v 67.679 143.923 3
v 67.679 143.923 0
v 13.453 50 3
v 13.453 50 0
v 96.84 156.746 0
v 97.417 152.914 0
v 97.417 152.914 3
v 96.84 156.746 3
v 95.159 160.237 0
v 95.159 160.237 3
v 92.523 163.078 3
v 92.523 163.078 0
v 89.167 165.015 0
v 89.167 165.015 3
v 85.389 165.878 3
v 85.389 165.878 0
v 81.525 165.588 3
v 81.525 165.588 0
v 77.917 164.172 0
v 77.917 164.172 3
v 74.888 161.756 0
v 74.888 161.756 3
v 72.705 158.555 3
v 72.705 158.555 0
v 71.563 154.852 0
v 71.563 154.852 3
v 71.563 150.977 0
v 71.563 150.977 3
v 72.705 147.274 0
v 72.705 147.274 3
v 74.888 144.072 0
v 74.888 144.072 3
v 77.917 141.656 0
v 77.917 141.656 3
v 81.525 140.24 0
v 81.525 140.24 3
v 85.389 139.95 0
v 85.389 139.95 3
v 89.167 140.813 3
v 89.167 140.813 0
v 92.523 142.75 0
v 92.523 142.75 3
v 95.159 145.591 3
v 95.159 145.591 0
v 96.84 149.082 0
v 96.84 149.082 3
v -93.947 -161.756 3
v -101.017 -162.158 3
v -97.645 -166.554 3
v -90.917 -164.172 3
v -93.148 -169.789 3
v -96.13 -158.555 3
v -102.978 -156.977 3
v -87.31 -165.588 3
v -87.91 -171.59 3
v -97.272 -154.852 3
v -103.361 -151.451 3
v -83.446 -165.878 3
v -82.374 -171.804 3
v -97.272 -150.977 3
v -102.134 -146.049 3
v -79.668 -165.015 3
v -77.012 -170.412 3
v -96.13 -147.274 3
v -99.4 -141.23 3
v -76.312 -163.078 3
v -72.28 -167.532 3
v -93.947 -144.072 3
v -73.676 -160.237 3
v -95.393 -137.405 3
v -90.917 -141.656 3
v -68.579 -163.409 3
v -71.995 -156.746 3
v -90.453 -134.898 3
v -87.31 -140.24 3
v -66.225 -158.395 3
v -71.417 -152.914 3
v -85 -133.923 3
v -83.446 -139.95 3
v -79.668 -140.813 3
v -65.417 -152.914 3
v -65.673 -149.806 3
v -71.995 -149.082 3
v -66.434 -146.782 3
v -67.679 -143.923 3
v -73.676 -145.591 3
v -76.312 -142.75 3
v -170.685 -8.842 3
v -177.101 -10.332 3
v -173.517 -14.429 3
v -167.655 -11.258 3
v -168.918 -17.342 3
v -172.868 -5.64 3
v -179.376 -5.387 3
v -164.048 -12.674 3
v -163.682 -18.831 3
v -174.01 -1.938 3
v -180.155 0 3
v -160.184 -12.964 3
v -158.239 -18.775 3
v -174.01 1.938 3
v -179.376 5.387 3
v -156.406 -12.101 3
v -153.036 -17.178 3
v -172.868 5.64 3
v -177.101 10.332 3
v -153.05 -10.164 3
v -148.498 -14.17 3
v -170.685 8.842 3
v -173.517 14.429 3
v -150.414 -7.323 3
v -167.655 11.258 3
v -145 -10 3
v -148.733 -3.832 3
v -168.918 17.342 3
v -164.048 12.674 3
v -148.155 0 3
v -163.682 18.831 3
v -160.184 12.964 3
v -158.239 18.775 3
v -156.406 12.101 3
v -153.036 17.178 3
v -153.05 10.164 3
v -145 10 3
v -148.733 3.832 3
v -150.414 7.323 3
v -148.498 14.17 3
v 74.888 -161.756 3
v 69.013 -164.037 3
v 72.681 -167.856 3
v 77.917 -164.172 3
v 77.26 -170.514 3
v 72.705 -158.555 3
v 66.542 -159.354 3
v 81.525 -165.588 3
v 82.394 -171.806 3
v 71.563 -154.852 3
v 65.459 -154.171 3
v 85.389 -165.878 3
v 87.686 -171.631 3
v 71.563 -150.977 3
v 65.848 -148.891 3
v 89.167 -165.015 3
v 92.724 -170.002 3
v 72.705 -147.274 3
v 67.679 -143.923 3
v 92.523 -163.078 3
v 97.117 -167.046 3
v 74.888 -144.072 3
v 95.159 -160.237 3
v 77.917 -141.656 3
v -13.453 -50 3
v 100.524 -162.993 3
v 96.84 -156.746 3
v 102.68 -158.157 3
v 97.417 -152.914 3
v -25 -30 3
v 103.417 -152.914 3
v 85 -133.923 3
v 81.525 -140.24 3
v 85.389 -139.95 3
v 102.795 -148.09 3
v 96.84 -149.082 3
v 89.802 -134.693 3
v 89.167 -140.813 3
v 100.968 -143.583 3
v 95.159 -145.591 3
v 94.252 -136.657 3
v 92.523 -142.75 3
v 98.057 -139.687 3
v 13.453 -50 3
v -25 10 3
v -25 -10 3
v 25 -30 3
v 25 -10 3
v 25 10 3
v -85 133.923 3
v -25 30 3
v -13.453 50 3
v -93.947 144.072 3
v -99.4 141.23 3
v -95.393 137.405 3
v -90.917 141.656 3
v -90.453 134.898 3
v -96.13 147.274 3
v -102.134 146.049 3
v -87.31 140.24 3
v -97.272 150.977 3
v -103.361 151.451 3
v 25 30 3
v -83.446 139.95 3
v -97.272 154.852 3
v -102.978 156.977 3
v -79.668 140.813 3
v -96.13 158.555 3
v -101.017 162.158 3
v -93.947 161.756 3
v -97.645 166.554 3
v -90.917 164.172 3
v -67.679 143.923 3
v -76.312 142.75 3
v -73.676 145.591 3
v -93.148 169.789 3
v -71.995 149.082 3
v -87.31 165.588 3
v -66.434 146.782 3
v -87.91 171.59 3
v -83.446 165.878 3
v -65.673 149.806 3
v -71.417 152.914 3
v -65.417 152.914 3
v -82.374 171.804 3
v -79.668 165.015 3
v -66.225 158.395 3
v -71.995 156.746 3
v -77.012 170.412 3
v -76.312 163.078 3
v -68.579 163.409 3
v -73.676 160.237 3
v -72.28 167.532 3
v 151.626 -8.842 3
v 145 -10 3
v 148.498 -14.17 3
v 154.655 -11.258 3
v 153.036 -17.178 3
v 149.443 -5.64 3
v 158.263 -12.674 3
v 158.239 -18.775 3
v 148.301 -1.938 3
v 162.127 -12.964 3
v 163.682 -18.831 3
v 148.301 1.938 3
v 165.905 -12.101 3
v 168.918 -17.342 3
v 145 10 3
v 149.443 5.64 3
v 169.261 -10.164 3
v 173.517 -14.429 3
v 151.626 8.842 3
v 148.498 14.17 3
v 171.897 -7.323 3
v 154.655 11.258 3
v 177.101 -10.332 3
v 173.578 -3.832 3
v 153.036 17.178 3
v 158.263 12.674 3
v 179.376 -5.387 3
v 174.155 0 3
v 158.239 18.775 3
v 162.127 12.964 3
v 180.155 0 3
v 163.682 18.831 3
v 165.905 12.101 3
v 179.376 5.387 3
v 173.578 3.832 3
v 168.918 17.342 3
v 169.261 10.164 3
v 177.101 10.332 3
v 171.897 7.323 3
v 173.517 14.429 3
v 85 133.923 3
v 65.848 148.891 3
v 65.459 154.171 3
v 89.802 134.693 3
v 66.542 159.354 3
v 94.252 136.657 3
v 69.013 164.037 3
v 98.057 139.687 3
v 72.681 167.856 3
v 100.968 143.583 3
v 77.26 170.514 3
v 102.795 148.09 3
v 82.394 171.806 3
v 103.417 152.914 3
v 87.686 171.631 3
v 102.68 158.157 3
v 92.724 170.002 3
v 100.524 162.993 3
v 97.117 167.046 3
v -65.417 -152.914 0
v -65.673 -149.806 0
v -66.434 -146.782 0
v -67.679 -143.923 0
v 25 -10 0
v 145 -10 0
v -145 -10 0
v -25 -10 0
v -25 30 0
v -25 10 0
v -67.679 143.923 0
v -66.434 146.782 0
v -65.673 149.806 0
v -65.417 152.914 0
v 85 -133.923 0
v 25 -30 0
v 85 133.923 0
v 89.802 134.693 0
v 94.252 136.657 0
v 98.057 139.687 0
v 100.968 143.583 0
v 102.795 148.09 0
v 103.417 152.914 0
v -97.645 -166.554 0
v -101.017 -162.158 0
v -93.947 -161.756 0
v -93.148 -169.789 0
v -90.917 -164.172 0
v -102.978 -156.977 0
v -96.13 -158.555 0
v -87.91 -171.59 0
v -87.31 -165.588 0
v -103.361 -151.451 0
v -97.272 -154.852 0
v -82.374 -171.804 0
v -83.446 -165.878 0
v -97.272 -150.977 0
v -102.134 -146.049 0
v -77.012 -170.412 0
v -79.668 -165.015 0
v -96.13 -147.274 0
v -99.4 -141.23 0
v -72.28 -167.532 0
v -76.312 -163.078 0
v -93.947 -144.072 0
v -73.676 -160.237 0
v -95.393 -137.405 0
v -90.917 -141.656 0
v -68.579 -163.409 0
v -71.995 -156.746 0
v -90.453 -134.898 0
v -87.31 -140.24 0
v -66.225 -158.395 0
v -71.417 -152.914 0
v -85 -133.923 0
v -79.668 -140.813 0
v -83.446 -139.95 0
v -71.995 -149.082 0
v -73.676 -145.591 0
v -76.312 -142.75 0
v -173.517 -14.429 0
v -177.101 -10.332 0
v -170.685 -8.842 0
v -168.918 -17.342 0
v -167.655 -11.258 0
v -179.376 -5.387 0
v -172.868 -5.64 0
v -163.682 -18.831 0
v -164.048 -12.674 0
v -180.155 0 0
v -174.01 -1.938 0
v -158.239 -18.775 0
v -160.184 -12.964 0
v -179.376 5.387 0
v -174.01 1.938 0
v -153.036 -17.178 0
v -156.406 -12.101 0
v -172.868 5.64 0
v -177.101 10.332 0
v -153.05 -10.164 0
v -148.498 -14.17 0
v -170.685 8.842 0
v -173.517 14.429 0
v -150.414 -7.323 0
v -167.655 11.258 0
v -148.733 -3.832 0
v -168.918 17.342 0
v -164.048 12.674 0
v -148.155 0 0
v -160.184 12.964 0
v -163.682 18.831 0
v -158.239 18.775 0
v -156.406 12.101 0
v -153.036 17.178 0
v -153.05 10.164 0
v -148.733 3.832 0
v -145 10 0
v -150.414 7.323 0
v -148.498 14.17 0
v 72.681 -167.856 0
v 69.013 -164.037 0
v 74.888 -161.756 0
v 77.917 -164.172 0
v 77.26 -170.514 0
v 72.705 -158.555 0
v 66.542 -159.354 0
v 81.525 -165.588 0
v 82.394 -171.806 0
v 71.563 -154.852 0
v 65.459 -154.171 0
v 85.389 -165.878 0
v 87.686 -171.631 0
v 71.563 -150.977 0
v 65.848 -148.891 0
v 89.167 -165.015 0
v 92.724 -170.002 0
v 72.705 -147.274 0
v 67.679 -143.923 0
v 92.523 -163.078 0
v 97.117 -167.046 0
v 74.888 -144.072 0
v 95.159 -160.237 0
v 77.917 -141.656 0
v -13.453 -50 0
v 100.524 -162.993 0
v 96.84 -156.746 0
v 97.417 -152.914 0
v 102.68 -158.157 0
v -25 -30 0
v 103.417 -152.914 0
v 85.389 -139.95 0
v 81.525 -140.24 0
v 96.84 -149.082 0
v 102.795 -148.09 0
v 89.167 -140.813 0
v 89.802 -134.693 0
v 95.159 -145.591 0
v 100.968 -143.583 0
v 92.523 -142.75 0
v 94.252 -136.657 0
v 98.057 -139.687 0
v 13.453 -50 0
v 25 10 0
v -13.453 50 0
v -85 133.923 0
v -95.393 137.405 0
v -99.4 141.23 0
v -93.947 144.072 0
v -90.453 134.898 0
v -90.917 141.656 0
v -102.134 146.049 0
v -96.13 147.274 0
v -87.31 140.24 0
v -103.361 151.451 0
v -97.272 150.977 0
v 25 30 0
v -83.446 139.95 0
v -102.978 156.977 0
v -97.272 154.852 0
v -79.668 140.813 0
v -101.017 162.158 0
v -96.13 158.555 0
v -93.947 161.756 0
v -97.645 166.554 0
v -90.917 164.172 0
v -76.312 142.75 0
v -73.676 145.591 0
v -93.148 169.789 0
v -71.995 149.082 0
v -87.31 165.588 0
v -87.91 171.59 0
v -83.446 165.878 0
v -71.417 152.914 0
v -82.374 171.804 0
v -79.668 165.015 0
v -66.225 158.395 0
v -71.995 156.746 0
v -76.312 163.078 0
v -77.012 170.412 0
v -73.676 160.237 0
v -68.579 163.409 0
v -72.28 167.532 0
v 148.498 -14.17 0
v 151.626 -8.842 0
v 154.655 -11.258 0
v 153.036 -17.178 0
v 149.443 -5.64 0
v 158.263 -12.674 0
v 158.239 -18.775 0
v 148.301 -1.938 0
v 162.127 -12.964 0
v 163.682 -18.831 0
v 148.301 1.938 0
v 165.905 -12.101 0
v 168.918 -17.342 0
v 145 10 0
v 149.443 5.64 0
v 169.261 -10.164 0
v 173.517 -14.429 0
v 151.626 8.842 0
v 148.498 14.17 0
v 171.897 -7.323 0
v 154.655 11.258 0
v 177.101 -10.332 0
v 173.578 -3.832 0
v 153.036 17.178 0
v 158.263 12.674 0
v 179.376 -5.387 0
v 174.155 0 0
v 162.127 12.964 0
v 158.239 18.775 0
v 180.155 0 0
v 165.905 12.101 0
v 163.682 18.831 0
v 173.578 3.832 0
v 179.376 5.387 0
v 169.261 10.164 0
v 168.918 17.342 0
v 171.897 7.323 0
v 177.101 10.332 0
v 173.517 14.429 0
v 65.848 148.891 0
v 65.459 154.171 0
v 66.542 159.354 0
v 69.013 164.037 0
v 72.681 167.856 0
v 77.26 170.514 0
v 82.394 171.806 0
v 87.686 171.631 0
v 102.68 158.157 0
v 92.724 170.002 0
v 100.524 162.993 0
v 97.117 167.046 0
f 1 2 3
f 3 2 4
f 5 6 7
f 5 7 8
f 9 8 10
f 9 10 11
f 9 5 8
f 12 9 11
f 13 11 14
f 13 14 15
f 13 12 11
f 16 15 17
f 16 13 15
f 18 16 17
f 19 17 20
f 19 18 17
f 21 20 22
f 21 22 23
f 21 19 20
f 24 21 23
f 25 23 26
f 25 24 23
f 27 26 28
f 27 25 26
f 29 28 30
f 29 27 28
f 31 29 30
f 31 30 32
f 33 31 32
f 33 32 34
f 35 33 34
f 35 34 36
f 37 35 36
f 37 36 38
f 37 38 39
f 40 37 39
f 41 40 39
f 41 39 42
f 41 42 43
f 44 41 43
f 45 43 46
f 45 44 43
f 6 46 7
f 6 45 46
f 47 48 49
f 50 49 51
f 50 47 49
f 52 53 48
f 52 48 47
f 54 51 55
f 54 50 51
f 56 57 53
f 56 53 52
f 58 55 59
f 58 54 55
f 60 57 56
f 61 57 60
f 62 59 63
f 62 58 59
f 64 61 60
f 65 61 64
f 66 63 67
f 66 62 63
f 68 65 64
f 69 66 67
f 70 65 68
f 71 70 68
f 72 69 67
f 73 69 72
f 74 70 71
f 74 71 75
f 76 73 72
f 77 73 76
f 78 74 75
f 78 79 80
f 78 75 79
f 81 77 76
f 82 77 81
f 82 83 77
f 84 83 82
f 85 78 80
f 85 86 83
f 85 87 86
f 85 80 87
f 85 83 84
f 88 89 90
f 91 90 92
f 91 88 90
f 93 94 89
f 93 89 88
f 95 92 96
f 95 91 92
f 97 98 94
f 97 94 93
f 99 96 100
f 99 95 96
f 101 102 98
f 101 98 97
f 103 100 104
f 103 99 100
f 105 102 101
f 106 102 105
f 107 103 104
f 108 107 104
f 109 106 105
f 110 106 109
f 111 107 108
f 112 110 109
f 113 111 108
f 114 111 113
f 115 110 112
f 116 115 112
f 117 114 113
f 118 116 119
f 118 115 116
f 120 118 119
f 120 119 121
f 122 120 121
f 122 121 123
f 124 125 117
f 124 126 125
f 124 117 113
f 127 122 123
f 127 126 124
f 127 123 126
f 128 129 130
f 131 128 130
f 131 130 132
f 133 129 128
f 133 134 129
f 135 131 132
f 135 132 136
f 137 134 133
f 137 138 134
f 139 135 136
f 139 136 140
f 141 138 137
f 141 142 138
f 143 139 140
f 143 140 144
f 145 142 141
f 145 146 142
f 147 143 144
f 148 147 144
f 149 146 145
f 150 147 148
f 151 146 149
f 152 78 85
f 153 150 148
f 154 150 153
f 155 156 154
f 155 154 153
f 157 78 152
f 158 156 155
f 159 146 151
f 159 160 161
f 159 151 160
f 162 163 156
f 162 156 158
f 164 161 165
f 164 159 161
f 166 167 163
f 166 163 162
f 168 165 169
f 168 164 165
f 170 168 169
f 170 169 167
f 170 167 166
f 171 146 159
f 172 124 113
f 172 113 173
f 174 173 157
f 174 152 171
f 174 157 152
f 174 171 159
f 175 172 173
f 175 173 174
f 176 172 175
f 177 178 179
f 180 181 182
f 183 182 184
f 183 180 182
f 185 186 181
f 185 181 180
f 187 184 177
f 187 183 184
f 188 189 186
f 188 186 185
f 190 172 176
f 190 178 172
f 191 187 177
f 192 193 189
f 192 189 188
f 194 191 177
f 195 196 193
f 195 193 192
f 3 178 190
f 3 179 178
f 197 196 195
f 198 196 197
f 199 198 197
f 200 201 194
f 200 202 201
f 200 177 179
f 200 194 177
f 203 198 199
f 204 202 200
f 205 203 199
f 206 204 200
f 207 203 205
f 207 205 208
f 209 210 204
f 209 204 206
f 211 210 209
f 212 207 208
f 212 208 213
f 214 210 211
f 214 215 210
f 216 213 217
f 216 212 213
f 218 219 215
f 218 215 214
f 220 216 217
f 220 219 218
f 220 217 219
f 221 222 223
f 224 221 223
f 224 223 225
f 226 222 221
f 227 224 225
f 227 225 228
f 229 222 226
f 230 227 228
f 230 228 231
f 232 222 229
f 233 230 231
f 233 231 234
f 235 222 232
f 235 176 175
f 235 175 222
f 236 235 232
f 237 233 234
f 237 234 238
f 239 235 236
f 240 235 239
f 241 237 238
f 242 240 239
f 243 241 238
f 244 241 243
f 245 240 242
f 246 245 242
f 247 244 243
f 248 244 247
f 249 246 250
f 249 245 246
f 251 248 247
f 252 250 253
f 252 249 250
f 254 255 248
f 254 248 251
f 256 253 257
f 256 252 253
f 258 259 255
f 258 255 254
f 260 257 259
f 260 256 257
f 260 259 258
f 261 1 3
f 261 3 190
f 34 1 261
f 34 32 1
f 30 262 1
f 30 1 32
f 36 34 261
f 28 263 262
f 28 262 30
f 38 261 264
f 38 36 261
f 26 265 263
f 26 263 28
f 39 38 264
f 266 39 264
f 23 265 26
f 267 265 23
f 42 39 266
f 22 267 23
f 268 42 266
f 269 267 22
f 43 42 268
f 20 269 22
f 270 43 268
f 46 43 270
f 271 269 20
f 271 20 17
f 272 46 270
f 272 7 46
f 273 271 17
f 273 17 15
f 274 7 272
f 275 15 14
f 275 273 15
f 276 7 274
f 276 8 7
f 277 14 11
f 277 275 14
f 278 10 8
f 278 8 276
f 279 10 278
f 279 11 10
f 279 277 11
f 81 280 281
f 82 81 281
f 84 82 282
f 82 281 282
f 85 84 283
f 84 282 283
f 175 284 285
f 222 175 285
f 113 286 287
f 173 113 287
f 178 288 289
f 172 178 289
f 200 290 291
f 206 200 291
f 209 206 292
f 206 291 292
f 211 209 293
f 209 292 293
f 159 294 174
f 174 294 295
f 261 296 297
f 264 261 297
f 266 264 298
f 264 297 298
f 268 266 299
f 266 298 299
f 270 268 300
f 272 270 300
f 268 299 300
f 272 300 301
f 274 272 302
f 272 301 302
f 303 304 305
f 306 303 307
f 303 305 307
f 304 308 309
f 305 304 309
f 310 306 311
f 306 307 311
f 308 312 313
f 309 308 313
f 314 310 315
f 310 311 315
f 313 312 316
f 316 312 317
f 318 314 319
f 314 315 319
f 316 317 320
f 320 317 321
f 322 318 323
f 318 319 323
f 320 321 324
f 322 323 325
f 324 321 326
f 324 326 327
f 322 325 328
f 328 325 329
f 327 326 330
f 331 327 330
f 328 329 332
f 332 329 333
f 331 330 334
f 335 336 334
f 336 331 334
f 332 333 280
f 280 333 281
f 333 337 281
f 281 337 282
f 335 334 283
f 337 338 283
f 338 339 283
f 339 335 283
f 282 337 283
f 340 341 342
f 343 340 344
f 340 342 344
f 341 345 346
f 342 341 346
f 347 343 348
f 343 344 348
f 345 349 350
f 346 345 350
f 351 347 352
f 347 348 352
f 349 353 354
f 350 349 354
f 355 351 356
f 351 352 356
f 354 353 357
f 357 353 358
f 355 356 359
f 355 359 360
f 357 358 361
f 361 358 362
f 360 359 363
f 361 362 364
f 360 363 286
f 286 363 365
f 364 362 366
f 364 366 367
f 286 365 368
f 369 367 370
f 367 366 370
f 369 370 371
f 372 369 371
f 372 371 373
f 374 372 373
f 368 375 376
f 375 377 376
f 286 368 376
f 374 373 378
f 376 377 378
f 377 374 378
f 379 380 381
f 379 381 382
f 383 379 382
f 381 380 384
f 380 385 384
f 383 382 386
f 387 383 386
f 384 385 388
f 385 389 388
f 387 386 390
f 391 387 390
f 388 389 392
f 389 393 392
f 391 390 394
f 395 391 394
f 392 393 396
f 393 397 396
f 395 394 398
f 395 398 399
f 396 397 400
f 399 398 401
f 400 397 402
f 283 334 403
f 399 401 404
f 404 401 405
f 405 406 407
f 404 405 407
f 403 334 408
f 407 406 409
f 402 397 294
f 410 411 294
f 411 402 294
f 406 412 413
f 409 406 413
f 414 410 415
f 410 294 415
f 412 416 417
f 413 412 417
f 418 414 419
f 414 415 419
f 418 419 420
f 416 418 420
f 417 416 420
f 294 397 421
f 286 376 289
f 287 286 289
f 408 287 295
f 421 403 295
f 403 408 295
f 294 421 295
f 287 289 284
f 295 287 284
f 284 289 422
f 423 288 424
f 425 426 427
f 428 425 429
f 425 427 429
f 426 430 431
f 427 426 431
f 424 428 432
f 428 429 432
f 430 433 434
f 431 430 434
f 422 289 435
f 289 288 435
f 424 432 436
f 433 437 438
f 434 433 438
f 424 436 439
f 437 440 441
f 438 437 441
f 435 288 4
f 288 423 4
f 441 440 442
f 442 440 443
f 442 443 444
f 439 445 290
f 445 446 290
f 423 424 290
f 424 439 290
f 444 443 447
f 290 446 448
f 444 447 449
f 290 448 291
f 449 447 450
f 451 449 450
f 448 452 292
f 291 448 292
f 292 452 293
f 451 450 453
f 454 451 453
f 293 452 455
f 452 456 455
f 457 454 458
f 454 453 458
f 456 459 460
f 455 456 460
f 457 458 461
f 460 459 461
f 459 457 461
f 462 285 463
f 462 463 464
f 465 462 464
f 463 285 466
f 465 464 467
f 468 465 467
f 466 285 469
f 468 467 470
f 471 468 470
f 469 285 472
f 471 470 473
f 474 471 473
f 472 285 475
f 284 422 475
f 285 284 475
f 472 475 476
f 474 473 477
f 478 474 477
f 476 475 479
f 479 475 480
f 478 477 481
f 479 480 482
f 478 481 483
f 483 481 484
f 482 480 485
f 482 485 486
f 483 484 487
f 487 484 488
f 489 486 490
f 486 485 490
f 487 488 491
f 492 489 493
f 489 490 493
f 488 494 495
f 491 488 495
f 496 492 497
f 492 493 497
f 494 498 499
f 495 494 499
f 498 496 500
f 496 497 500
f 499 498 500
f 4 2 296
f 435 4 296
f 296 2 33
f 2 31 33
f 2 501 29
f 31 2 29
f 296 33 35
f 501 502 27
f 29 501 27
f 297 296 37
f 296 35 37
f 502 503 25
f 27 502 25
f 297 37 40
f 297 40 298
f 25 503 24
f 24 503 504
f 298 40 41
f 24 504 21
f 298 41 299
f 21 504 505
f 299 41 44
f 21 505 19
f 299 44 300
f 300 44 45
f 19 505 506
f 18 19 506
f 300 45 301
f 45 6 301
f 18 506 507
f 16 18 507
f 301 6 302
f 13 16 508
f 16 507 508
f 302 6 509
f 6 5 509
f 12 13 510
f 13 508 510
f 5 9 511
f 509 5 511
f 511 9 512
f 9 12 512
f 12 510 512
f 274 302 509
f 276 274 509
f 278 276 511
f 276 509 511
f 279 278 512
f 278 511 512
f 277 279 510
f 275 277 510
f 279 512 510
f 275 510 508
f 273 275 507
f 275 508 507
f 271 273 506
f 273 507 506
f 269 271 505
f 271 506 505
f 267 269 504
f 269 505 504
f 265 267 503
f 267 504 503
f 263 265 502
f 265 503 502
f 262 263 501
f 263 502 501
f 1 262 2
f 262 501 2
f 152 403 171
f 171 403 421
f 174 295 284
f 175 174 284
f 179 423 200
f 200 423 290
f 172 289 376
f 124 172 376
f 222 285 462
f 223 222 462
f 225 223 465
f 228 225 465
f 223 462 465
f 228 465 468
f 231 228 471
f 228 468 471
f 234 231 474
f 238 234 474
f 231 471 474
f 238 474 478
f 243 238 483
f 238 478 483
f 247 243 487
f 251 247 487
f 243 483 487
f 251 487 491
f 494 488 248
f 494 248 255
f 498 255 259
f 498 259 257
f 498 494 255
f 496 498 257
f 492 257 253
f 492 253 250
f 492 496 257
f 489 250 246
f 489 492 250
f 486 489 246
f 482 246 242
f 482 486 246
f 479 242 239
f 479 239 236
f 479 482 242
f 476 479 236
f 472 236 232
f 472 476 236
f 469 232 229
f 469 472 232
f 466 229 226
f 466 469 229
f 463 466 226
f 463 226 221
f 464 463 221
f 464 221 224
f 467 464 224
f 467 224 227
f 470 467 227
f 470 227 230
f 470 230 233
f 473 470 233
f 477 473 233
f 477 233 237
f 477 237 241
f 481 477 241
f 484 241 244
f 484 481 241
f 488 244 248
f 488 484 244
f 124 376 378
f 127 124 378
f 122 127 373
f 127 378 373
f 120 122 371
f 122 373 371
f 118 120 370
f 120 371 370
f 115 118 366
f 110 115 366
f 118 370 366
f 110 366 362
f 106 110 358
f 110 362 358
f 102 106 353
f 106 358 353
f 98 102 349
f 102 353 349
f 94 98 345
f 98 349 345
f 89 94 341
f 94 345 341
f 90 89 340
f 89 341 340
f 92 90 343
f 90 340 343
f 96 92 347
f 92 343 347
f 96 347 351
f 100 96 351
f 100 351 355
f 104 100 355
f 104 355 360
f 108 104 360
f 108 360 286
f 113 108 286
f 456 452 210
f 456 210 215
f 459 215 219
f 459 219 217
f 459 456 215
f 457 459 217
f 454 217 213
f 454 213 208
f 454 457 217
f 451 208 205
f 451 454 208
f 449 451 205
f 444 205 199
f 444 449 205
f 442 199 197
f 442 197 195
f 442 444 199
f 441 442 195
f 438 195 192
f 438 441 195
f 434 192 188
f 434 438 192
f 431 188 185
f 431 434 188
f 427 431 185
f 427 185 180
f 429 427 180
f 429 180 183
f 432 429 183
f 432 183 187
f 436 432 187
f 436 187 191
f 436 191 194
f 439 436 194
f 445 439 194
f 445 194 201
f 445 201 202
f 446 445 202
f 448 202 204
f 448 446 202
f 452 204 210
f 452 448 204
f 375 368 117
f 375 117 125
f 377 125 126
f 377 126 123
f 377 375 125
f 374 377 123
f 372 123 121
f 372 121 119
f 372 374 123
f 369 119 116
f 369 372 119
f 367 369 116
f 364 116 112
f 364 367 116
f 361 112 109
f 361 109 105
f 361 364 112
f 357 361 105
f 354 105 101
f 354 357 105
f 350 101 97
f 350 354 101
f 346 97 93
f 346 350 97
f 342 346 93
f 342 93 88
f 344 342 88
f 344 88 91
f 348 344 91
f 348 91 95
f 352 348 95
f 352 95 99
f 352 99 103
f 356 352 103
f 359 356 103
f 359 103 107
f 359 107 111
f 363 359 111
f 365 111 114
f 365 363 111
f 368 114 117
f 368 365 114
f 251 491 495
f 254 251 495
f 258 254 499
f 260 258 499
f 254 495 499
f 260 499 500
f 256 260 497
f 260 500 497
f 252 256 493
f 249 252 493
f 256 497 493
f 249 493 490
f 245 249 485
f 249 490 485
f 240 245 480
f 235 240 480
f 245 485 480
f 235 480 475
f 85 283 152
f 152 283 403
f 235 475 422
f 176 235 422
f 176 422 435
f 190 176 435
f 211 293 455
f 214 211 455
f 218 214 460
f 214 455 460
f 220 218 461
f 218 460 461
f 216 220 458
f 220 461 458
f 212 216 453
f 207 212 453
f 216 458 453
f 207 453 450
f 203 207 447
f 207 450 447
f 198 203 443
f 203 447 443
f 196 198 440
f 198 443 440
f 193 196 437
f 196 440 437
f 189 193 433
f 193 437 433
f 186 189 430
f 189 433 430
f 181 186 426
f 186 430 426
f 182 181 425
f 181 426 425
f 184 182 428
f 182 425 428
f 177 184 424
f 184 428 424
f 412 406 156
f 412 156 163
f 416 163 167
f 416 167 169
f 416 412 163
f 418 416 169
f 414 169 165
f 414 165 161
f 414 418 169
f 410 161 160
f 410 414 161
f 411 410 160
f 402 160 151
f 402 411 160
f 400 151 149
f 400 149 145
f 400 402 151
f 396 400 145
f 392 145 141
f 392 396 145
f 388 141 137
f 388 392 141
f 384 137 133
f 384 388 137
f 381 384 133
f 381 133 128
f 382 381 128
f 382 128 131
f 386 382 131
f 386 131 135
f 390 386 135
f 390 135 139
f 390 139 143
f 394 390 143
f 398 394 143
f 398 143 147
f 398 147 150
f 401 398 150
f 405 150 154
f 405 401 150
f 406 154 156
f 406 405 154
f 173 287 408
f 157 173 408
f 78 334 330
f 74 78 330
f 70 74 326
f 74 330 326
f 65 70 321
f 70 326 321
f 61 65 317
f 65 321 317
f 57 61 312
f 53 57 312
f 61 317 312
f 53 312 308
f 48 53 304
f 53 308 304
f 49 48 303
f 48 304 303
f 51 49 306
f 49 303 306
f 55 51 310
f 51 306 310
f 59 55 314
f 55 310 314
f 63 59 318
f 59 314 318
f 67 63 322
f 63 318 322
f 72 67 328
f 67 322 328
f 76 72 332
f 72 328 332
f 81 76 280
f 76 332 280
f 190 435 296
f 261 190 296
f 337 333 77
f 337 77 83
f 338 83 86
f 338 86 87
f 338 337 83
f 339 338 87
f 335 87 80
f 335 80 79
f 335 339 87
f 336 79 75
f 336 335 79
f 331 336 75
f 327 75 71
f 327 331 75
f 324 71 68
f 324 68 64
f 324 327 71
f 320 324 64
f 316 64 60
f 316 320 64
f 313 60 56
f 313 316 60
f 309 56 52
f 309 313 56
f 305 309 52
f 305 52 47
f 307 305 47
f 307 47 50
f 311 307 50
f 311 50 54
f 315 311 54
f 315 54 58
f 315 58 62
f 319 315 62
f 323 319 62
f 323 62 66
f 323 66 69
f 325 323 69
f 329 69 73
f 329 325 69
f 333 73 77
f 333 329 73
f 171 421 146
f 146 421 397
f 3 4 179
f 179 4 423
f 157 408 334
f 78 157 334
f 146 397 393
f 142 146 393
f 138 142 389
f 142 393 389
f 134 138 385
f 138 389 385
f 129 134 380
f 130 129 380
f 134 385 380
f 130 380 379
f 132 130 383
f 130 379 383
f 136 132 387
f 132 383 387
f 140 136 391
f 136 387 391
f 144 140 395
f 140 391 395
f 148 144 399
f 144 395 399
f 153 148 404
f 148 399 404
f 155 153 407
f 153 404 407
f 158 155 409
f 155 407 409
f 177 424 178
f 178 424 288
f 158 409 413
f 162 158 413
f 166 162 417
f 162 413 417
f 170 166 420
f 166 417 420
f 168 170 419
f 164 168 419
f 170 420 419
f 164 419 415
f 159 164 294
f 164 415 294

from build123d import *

# Parameters (mm, degrees)
F0_R     = 13
F1_DEPTH = 3


with BuildPart() as f1:
    # F0 (on Top) → F1 (new body)
    with BuildSketch(Plane.XY):
        Polygon((25, 30), (25, 50), (13.452995, 50), (-13.452995, 50), (-25, 50), (-25, 30), (-25, 10), (-25, -10), (-25, -30), (-25, -50), (-13.452995, -50), (13.452995, -50), (25, -50), (25, -30), (25, -10), (25, 10), align=None)
        with BuildLine():
            Line((13.452995, 50), (25, 50))
            Line((25, 50), (25, 30))
            Line((25, 30), (85, 133.923048))
            ThreePointArc((85, 133.923048), (74.917493, 136.459634), (67.679492, 143.923048))
            Line((67.679492, 143.923048), (13.452995, 50))
        make_face()
        with BuildLine():
            Line((-25, 50), (-13.452995, 50))
            Line((-13.452995, 50), (-67.679492, 143.923048))
            ThreePointArc((-67.679492, 143.923048), (-74.917493, 136.459634), (-85, 133.923048))
            Line((-85, 133.923048), (-25, 30))
            Line((-25, 30), (-25, 50))
        make_face()
        with BuildLine():
            ThreePointArc((103.417493, 152.914117), (79.781872, 171.339942), (67.679492, 143.923048))
            ThreePointArc((67.679492, 143.923048), (74.917493, 136.459634), (85, 133.923048))
            ThreePointArc((85, 133.923048), (98.056915, 139.686639), (103.417493, 152.914117))
        make_face()
        with Locations((84.417493, 152.914117)):
            Circle(F0_R, mode=Mode.SUBTRACT)
        with BuildLine():
            Line((145, 10), (25, 10))
            Line((25, 10), (25, -10))
            Line((25, -10), (145, -10))
            ThreePointArc((145, -10), (142.155494, 0), (145, 10))
        make_face()
        with BuildLine():
            ThreePointArc((-85, 133.923048), (-74.917493, 136.459634), (-67.679492, 143.923048))
            ThreePointArc((-67.679492, 143.923048), (-65.991669, 148.278495), (-65.417493, 152.914117))
            ThreePointArc((-65.417493, 152.914117), (-97.644972, 166.553538), (-85, 133.923048))
        make_face()
        with Locations((-84.417493, 152.914117)):
            Circle(F0_R, mode=Mode.SUBTRACT)
        with BuildLine():
            ThreePointArc((180.155494, 0), (166.353841, 18.275043), (145, 10))
            ThreePointArc((145, 10), (142.155494, 0), (145, -10))
            ThreePointArc((145, -10), (166.353841, -18.275043), (180.155494, 0))
        make_face()
        with Locations((161.155494, 0)):
            Circle(F0_R, mode=Mode.SUBTRACT)
        with BuildLine():
            Line((85, -133.923048), (25, -30))
            Line((25, -30), (25, -50))
            Line((25, -50), (13.452995, -50))
            Line((13.452995, -50), (67.679492, -143.923048))
            ThreePointArc((67.679492, -143.923048), (74.917493, -136.459634), (85, -133.923048))
        make_face()
        with BuildLine():
            Line((-25, -10), (-25, 10))
            Line((-25, 10), (-145, 10))
            ThreePointArc((-145, 10), (-142.880451, 5.198346), (-142.155494, 0))
            ThreePointArc((-142.155494, 0), (-142.880451, -5.198346), (-145, -10))
            Line((-145, -10), (-25, -10))
        make_face()
        with BuildLine():
            ThreePointArc((103.417493, -152.914117), (98.056915, -139.686639), (85, -133.923048))
            ThreePointArc((85, -133.923048), (74.917493, -136.459634), (67.679492, -143.923048))
            ThreePointArc((67.679492, -143.923048), (79.781872, -171.339942), (103.417493, -152.914117))
        make_face()
        with Locations((84.417493, -152.914117)):
            Circle(F0_R, mode=Mode.SUBTRACT)
        with BuildLine():
            ThreePointArc((-142.155494, 0), (-142.880451, 5.198346), (-145, 10))
            ThreePointArc((-145, 10), (-180.155494, 0), (-145, -10))
            ThreePointArc((-145, -10), (-142.880451, -5.198346), (-142.155494, 0))
        make_face()
        with Locations((-161.155494, 0)):
            Circle(F0_R, mode=Mode.SUBTRACT)
        with BuildLine():
            Line((-25, -50), (-25, -30))
            Line((-25, -30), (-85, -133.923048))
            ThreePointArc((-85, -133.923048), (-74.917493, -136.459634), (-67.679492, -143.923048))
            Line((-67.679492, -143.923048), (-13.452995, -50))
            Line((-13.452995, -50), (-25, -50))
        make_face()
        with BuildLine():
            ThreePointArc((-67.679492, -143.923048), (-74.917493, -136.459634), (-85, -133.923048))
            ThreePointArc((-85, -133.923048), (-97.644972, -166.553538), (-65.417493, -152.914117))
            ThreePointArc((-65.417493, -152.914117), (-65.991669, -148.278495), (-67.679492, -143.923048))
        make_face()
        with Locations((-84.417493, -152.914117)):
            Circle(F0_R, mode=Mode.SUBTRACT)
    extrude(amount=F1_DEPTH)


solid = f1.part
